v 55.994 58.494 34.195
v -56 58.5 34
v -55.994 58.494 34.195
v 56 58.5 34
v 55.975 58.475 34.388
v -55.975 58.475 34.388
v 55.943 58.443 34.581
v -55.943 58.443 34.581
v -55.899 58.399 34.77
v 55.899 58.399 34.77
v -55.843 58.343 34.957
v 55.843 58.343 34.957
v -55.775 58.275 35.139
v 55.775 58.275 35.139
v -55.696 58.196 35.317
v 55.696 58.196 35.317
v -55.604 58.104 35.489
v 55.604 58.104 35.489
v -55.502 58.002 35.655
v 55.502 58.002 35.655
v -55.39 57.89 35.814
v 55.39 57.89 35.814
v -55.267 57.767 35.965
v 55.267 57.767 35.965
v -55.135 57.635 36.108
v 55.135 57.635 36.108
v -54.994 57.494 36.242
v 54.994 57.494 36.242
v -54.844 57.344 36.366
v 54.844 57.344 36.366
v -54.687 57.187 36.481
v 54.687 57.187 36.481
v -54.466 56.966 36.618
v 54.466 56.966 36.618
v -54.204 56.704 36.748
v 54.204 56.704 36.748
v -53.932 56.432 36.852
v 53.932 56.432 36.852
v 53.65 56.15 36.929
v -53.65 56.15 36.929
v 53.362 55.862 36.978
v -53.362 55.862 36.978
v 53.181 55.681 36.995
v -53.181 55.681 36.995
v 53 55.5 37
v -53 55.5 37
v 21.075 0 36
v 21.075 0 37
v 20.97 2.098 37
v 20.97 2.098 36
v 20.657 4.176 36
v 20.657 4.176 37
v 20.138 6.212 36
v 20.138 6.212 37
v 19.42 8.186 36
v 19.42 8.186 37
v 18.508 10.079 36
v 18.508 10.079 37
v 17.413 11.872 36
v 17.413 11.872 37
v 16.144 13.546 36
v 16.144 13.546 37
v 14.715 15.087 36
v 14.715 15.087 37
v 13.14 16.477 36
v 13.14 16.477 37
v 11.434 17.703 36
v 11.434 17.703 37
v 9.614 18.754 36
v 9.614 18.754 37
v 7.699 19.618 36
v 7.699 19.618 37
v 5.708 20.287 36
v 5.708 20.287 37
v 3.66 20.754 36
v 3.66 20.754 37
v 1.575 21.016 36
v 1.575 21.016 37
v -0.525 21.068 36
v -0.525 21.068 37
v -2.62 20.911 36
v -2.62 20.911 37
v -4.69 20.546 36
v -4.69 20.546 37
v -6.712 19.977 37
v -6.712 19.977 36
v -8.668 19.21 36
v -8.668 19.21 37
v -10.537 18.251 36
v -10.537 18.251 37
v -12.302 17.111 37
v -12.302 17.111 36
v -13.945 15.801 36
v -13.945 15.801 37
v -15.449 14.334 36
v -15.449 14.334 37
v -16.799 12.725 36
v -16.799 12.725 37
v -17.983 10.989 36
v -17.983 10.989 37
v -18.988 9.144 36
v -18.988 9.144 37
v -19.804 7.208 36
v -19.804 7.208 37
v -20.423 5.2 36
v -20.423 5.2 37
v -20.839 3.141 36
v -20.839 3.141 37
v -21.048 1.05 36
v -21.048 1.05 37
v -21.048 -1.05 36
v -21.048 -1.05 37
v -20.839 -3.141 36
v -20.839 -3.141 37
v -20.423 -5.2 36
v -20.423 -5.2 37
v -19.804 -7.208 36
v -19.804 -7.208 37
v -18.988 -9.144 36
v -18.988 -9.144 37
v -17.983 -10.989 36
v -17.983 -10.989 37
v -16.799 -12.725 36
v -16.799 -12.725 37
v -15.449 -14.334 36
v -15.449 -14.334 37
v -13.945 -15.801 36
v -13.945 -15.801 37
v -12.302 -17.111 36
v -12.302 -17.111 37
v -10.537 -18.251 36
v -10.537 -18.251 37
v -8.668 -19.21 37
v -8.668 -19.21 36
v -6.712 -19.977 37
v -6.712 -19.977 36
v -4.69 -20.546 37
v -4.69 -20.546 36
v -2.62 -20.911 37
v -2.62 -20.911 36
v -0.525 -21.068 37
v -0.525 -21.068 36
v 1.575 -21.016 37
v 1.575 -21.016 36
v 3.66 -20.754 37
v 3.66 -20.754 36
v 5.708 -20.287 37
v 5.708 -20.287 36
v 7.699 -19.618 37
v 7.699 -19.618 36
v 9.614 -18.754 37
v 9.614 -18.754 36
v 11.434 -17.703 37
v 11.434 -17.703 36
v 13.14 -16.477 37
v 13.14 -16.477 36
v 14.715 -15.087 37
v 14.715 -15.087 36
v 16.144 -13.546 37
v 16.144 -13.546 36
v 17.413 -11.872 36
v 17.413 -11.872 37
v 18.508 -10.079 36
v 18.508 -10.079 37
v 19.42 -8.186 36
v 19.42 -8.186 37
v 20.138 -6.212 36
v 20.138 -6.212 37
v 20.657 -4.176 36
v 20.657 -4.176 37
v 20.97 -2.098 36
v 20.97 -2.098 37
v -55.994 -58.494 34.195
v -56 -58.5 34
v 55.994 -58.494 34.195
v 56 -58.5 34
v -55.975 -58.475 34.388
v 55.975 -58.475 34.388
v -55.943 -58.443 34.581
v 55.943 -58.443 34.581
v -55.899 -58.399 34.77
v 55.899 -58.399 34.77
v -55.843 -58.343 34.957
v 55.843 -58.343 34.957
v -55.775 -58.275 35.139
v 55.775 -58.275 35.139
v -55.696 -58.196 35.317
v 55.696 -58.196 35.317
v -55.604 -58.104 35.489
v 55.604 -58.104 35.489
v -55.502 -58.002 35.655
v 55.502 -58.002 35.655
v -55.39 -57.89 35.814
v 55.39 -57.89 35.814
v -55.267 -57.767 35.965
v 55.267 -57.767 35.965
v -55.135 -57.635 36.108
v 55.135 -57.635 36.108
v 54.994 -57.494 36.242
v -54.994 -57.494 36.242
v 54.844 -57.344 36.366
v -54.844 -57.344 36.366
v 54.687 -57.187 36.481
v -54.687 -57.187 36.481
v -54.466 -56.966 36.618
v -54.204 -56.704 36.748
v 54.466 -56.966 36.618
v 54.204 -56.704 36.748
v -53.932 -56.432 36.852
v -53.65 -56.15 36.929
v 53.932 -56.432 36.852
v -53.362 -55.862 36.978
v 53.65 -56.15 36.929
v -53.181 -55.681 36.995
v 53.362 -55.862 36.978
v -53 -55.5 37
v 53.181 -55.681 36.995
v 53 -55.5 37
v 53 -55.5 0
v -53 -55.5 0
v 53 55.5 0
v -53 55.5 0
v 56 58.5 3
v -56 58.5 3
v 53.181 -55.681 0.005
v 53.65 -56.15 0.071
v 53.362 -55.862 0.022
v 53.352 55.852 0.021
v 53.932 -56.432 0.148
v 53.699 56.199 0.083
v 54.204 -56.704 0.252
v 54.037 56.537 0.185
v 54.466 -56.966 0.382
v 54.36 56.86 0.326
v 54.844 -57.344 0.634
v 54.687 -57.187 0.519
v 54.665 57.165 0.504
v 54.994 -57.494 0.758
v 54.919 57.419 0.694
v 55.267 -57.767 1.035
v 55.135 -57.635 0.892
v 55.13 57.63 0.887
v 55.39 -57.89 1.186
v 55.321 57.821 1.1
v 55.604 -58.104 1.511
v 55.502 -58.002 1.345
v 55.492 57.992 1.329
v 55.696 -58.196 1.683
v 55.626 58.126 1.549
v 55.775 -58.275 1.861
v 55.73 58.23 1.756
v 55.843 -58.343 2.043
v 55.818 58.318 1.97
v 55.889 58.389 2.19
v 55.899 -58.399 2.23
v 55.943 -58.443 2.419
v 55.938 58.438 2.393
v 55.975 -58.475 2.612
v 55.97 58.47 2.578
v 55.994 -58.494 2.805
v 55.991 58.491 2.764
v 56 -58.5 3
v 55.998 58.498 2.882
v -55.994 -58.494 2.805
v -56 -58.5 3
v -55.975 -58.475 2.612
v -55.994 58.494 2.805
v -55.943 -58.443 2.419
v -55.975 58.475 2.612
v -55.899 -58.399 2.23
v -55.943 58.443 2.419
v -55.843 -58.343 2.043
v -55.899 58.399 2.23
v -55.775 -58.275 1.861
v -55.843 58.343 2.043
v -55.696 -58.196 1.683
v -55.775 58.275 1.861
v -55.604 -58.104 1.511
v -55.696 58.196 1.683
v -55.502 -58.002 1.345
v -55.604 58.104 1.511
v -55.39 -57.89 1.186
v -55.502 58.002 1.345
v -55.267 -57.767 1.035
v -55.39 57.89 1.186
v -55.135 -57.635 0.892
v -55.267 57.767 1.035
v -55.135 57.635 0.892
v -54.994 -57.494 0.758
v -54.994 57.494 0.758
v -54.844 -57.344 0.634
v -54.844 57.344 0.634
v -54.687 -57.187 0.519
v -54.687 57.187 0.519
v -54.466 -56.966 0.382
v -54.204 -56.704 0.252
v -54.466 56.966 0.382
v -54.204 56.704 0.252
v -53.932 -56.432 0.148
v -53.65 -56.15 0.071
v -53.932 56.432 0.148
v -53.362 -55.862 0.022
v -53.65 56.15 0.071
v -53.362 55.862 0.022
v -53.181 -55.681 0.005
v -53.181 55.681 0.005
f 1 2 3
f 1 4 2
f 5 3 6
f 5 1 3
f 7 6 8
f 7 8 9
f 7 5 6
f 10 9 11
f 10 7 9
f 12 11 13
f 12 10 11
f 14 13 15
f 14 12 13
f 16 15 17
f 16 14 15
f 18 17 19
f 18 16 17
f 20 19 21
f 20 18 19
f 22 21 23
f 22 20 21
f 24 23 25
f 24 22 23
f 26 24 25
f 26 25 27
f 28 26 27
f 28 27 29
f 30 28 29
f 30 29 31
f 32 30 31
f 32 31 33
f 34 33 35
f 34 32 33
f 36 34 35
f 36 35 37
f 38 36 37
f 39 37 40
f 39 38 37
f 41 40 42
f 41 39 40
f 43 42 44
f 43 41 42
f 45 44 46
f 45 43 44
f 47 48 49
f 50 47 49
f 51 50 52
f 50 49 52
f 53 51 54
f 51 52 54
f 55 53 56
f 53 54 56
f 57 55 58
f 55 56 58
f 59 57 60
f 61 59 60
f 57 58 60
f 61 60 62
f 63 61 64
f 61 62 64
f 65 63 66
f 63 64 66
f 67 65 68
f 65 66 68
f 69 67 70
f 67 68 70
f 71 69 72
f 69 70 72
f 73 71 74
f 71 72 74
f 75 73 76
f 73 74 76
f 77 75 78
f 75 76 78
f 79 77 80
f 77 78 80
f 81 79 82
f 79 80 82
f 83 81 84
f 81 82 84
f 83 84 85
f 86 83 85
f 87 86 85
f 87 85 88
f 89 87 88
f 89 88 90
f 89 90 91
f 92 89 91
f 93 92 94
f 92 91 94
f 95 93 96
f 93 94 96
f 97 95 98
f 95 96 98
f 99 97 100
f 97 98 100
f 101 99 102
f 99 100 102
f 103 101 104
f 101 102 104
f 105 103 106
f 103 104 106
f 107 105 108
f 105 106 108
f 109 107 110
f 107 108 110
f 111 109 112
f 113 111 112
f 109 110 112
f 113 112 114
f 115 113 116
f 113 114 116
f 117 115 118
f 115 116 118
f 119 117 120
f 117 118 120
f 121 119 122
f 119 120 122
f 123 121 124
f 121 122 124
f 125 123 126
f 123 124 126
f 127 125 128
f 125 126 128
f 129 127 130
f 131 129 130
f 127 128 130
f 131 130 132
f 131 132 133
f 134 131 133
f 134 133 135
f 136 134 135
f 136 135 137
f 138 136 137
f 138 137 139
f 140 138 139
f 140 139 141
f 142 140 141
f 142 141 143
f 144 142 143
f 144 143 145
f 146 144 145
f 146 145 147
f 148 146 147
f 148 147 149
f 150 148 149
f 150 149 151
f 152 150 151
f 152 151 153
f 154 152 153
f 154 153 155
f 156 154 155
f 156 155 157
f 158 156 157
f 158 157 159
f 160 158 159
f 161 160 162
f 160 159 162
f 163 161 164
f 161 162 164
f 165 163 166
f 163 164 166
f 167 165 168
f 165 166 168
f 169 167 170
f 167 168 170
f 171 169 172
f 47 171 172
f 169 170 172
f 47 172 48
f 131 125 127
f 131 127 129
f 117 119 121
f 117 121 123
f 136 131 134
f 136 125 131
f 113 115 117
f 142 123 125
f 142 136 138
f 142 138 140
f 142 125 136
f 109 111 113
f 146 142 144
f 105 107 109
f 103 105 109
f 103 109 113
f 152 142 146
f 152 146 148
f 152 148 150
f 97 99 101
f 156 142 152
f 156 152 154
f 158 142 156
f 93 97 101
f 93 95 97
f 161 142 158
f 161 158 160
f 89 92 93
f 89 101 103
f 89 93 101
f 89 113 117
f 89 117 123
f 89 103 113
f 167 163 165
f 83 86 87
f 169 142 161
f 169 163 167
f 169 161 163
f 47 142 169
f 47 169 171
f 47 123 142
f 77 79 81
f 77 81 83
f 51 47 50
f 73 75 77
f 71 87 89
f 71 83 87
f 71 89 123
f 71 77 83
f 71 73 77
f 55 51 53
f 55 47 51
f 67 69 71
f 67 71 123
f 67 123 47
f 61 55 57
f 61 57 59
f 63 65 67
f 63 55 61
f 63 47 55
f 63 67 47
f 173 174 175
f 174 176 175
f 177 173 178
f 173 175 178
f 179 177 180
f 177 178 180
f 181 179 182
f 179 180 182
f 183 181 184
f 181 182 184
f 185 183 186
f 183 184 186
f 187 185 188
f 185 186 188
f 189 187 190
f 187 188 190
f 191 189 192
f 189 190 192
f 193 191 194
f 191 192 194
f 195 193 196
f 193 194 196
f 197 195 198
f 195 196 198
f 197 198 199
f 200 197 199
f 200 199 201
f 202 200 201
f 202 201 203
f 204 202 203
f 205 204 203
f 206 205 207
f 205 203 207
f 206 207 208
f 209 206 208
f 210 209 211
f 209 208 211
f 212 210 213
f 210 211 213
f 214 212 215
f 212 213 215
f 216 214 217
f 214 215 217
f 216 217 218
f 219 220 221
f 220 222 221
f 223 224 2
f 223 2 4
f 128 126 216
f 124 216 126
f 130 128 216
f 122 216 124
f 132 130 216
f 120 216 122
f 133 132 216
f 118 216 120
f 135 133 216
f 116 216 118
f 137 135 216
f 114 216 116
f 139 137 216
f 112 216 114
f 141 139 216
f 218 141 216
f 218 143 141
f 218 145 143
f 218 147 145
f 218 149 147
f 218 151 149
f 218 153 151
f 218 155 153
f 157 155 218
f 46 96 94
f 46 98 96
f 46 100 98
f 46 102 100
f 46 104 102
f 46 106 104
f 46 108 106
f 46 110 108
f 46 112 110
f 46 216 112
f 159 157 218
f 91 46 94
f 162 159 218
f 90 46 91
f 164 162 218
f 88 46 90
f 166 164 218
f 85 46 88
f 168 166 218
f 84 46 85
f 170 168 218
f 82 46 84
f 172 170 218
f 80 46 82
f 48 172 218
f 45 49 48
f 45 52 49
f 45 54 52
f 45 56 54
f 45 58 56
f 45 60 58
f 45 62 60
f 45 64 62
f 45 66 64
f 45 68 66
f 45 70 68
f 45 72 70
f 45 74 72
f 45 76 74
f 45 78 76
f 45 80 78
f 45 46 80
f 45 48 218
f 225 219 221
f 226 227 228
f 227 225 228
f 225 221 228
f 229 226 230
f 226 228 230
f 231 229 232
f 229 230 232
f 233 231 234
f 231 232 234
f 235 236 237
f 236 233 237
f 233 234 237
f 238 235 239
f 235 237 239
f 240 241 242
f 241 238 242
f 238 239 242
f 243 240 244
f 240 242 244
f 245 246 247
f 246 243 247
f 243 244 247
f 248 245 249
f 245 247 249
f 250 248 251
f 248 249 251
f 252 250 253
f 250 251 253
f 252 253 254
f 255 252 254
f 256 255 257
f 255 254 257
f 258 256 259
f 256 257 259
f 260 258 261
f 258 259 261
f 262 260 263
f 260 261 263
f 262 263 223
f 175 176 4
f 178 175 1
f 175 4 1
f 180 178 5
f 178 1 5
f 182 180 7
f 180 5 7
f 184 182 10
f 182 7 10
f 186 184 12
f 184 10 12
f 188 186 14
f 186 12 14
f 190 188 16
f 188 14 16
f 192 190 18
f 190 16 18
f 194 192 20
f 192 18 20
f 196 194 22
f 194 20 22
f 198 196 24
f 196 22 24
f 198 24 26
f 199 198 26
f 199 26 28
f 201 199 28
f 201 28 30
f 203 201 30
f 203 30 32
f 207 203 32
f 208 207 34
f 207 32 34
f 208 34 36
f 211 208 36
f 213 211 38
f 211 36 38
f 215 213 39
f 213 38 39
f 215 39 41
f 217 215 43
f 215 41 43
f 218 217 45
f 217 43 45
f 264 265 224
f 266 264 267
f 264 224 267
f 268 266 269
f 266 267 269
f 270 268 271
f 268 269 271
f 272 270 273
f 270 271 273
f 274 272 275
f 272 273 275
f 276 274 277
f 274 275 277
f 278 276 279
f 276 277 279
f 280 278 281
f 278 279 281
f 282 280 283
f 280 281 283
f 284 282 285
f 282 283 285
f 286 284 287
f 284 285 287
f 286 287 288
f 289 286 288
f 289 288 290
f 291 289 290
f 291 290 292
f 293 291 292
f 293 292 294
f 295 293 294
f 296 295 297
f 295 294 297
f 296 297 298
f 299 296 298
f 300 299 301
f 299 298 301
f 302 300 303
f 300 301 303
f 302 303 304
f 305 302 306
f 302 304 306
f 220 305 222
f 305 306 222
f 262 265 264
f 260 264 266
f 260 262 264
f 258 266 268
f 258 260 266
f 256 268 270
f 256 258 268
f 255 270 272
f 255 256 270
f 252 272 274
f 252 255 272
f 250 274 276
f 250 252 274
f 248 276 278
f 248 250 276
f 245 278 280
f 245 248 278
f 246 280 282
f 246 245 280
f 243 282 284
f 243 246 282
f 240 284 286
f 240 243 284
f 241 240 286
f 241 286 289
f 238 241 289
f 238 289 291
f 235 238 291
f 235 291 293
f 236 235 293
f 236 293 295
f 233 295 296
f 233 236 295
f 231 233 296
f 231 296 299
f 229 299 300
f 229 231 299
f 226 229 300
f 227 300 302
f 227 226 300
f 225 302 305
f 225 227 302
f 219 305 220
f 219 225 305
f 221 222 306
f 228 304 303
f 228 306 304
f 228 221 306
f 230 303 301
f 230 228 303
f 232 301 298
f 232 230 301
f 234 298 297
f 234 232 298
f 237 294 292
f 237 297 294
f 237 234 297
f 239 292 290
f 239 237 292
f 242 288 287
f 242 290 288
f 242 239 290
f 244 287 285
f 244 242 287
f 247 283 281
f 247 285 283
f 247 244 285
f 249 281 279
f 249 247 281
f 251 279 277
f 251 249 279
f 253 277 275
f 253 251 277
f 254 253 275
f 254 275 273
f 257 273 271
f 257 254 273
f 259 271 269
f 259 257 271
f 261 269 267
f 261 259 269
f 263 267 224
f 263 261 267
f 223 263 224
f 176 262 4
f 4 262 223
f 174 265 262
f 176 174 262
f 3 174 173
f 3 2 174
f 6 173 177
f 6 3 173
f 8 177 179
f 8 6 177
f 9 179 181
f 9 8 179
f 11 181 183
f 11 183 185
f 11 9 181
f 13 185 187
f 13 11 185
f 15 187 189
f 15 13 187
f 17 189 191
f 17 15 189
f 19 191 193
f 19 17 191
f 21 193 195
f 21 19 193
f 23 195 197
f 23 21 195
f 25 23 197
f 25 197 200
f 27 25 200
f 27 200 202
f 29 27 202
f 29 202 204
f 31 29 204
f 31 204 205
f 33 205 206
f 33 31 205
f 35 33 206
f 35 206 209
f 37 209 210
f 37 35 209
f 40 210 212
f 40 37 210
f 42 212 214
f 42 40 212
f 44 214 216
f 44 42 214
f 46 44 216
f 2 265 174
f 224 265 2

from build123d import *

# Parameters (mm, degrees)
SKETCH_1_W          = 112
SKETCH_1_H          = 117
EXTRUDE_1_DEPTH     = 37
FILLET_1_R          = 3
FILLET_2_R          = 3
SKETCH_2_R          = 21.074583211
CUT_EXTRUDE_1_DEPTH = 1


with BuildPart() as part:
    # 草图1 → 凸台-拉伸1 (new body)
    with BuildSketch(Plane.XY):
        Rectangle(SKETCH_1_W, SKETCH_1_H)
    extrude(amount=EXTRUDE_1_DEPTH)

    # 圆角1
    fillet_1_edges = [part.edges().sort_by_distance(p)[0] for p in [
        (-56, 0, 37),
        (0, -58.5, 37),
        (56, 0, 37),
        (0, 58.5, 37),
    ]]
    fillet(fillet_1_edges, radius=FILLET_1_R)

    # 圆角2
    fillet_2_edges = [part.edges().sort_by_distance(p)[0] for p in [
        (0, -58.5, 0),
        (-56, 0, 0),
        (0, 58.5, 0),
        (56, 0, 0),
    ]]
    fillet(fillet_2_edges, radius=FILLET_2_R)

    # 草图2 → 切除-拉伸1 (cut)
    with BuildSketch(Plane.XY.offset(37)):
        Circle(SKETCH_2_R)
    extrude(amount=-CUT_EXTRUDE_1_DEPTH, mode=Mode.SUBTRACT)


solid = part.part
